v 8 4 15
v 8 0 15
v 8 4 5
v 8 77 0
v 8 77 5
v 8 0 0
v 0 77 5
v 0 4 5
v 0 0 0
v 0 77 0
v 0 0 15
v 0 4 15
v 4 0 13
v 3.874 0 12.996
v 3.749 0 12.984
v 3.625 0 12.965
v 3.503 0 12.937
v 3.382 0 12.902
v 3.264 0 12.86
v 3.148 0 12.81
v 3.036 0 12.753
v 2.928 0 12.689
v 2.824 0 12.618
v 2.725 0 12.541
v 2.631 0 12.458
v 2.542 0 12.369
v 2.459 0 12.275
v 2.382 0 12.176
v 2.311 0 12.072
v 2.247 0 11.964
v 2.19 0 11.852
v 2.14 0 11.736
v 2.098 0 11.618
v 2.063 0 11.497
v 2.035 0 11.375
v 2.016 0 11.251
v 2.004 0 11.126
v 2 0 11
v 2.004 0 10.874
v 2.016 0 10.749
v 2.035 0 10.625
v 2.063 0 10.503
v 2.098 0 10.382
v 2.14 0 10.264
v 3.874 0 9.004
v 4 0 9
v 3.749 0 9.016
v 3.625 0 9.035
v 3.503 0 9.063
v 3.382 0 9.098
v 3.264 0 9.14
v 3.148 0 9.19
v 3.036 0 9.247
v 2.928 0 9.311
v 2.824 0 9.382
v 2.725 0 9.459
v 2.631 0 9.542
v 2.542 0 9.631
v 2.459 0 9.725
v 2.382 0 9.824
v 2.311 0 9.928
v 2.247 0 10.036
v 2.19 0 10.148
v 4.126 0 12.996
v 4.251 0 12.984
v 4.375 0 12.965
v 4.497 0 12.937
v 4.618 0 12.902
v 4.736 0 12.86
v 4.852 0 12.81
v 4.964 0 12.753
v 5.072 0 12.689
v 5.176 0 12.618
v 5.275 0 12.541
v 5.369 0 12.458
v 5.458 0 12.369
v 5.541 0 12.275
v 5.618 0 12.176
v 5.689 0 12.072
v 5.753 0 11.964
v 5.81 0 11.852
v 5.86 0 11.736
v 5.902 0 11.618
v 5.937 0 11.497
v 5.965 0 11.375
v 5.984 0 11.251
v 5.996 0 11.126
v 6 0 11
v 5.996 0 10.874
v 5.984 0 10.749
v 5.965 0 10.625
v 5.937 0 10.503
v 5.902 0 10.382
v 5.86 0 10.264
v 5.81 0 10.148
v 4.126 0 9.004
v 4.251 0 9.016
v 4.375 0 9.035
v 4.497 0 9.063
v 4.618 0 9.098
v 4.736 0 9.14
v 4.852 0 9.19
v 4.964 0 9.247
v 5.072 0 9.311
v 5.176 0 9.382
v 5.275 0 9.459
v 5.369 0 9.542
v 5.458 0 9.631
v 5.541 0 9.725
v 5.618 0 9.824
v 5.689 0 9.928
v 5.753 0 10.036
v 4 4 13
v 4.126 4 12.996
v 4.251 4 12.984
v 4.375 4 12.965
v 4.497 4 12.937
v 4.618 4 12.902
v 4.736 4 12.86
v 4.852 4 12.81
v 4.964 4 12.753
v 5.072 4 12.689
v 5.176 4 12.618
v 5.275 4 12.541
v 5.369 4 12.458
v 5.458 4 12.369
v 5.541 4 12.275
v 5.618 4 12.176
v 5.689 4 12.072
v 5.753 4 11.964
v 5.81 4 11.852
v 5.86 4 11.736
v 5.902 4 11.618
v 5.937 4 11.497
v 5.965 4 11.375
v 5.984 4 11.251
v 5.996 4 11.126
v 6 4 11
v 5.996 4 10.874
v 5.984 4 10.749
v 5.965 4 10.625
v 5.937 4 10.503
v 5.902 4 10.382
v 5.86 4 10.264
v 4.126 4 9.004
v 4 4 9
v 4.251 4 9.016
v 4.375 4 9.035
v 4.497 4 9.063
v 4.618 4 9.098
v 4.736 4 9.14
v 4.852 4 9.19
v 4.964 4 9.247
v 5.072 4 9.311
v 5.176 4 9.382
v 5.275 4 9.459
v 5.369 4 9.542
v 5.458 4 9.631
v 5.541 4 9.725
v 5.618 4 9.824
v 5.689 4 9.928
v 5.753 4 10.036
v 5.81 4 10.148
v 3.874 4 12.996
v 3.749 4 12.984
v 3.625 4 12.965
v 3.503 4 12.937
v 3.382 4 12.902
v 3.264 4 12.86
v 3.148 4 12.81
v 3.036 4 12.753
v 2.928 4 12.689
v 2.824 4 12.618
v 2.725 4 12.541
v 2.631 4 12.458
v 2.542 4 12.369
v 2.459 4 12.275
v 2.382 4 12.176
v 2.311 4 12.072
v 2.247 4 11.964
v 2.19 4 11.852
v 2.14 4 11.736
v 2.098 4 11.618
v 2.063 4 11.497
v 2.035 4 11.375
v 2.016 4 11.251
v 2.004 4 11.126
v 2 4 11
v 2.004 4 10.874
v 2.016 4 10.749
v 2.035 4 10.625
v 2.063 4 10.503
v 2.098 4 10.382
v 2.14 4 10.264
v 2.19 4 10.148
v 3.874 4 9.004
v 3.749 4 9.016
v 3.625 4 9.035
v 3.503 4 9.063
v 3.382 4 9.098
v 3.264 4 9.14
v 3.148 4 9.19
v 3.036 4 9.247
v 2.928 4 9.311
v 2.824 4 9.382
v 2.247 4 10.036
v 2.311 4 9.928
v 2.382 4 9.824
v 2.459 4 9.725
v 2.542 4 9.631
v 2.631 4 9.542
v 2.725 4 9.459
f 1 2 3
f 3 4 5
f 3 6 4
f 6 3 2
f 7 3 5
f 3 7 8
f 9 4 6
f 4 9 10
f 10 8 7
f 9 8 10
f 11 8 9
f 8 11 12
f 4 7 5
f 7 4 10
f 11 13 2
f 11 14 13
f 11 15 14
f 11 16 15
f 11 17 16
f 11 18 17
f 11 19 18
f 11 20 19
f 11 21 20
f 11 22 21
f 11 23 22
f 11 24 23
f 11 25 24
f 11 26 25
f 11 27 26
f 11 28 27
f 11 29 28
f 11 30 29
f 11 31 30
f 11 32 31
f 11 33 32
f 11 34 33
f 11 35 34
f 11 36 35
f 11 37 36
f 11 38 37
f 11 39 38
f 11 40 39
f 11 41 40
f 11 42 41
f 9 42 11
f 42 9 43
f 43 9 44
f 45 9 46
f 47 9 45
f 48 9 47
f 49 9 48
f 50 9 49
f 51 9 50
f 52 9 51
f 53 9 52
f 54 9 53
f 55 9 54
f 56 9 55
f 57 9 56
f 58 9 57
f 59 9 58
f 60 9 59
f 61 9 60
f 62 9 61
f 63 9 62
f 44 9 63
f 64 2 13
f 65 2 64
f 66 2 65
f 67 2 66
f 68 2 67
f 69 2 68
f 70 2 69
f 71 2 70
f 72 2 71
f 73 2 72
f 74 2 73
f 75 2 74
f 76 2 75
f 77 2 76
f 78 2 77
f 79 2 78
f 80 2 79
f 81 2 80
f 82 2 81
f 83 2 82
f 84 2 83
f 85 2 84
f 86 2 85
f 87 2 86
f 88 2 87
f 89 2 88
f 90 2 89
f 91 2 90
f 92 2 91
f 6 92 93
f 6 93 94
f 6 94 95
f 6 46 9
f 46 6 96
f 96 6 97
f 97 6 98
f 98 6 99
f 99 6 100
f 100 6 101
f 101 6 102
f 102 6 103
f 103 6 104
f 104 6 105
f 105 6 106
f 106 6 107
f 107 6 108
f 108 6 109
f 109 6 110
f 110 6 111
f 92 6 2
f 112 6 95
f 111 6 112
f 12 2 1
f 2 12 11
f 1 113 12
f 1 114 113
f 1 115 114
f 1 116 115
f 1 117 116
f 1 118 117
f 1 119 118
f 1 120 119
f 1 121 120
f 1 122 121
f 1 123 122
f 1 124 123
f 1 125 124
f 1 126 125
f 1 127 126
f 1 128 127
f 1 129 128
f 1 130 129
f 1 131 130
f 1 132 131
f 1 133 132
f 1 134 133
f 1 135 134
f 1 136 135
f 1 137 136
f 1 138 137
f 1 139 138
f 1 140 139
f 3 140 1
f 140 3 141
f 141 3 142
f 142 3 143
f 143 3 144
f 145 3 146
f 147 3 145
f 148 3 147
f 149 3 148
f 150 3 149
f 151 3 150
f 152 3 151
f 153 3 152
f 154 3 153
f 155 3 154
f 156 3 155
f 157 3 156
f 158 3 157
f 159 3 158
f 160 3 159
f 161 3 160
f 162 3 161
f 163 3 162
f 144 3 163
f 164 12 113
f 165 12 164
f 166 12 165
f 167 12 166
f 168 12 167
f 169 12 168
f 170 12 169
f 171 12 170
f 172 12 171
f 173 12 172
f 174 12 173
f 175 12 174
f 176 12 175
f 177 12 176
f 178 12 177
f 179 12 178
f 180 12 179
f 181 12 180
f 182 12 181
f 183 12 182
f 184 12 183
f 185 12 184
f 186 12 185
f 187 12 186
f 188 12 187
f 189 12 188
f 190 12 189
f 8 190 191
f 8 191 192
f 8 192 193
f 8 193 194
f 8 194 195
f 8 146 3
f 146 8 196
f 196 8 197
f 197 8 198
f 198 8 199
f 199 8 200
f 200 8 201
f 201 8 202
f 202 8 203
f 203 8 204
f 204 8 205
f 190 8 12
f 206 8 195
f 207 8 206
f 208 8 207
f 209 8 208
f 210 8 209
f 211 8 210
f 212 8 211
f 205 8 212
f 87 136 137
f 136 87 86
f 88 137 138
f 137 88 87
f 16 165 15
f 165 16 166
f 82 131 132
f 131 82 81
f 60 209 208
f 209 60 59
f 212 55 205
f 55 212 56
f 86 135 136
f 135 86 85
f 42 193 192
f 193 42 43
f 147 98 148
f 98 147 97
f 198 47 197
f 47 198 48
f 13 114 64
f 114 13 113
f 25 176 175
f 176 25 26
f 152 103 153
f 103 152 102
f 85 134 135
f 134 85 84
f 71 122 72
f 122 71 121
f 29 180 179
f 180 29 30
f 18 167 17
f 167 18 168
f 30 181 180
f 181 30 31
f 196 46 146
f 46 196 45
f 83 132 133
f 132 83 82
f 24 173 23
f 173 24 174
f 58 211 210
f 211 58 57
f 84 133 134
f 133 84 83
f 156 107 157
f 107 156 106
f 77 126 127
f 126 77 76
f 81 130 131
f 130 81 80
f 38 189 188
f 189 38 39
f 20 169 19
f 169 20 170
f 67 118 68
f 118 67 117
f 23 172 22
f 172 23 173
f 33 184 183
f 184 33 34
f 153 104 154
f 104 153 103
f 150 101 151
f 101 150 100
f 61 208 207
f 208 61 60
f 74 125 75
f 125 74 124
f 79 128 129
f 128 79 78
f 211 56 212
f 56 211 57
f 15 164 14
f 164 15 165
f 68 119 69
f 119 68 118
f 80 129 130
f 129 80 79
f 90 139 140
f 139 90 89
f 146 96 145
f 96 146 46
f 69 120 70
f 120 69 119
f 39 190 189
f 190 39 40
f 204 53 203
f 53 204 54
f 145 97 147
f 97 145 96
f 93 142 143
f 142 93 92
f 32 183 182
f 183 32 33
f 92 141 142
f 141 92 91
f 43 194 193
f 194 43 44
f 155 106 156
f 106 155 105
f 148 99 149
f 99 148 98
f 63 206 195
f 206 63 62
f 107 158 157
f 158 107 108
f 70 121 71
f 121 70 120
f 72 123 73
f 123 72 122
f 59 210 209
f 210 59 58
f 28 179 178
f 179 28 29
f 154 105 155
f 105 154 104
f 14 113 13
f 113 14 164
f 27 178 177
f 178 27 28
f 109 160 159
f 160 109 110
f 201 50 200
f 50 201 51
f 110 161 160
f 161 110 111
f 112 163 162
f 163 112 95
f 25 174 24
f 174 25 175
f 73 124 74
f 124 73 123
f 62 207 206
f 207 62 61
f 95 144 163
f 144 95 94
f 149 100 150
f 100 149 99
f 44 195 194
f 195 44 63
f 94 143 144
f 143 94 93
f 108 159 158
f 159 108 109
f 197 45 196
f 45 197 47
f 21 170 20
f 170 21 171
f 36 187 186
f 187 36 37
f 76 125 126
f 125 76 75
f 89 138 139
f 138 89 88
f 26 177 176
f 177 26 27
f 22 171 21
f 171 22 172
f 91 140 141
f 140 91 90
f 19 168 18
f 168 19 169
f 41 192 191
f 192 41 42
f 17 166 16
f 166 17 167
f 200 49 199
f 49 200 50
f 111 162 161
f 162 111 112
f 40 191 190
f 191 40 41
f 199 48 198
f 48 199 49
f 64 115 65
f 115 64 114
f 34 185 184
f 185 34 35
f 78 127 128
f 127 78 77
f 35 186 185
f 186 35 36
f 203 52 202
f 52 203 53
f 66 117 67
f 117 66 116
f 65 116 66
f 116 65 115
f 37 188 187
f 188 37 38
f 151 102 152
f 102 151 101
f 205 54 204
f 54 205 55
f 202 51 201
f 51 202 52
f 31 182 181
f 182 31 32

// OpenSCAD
difference(){
	union(){



        translate([0,0,0]){
           cube([8,77,5], center=false);
        }        
        translate([0,0,0]){
           cube([8,4,15], center=false);
        }        
             
        
	}
	union() {

        translate([4,20,11]){
            rotate([90,0,0]){
               cylinder(h=999, r=2, $fn=100, center=false);
            }
        }
     


	}
}
